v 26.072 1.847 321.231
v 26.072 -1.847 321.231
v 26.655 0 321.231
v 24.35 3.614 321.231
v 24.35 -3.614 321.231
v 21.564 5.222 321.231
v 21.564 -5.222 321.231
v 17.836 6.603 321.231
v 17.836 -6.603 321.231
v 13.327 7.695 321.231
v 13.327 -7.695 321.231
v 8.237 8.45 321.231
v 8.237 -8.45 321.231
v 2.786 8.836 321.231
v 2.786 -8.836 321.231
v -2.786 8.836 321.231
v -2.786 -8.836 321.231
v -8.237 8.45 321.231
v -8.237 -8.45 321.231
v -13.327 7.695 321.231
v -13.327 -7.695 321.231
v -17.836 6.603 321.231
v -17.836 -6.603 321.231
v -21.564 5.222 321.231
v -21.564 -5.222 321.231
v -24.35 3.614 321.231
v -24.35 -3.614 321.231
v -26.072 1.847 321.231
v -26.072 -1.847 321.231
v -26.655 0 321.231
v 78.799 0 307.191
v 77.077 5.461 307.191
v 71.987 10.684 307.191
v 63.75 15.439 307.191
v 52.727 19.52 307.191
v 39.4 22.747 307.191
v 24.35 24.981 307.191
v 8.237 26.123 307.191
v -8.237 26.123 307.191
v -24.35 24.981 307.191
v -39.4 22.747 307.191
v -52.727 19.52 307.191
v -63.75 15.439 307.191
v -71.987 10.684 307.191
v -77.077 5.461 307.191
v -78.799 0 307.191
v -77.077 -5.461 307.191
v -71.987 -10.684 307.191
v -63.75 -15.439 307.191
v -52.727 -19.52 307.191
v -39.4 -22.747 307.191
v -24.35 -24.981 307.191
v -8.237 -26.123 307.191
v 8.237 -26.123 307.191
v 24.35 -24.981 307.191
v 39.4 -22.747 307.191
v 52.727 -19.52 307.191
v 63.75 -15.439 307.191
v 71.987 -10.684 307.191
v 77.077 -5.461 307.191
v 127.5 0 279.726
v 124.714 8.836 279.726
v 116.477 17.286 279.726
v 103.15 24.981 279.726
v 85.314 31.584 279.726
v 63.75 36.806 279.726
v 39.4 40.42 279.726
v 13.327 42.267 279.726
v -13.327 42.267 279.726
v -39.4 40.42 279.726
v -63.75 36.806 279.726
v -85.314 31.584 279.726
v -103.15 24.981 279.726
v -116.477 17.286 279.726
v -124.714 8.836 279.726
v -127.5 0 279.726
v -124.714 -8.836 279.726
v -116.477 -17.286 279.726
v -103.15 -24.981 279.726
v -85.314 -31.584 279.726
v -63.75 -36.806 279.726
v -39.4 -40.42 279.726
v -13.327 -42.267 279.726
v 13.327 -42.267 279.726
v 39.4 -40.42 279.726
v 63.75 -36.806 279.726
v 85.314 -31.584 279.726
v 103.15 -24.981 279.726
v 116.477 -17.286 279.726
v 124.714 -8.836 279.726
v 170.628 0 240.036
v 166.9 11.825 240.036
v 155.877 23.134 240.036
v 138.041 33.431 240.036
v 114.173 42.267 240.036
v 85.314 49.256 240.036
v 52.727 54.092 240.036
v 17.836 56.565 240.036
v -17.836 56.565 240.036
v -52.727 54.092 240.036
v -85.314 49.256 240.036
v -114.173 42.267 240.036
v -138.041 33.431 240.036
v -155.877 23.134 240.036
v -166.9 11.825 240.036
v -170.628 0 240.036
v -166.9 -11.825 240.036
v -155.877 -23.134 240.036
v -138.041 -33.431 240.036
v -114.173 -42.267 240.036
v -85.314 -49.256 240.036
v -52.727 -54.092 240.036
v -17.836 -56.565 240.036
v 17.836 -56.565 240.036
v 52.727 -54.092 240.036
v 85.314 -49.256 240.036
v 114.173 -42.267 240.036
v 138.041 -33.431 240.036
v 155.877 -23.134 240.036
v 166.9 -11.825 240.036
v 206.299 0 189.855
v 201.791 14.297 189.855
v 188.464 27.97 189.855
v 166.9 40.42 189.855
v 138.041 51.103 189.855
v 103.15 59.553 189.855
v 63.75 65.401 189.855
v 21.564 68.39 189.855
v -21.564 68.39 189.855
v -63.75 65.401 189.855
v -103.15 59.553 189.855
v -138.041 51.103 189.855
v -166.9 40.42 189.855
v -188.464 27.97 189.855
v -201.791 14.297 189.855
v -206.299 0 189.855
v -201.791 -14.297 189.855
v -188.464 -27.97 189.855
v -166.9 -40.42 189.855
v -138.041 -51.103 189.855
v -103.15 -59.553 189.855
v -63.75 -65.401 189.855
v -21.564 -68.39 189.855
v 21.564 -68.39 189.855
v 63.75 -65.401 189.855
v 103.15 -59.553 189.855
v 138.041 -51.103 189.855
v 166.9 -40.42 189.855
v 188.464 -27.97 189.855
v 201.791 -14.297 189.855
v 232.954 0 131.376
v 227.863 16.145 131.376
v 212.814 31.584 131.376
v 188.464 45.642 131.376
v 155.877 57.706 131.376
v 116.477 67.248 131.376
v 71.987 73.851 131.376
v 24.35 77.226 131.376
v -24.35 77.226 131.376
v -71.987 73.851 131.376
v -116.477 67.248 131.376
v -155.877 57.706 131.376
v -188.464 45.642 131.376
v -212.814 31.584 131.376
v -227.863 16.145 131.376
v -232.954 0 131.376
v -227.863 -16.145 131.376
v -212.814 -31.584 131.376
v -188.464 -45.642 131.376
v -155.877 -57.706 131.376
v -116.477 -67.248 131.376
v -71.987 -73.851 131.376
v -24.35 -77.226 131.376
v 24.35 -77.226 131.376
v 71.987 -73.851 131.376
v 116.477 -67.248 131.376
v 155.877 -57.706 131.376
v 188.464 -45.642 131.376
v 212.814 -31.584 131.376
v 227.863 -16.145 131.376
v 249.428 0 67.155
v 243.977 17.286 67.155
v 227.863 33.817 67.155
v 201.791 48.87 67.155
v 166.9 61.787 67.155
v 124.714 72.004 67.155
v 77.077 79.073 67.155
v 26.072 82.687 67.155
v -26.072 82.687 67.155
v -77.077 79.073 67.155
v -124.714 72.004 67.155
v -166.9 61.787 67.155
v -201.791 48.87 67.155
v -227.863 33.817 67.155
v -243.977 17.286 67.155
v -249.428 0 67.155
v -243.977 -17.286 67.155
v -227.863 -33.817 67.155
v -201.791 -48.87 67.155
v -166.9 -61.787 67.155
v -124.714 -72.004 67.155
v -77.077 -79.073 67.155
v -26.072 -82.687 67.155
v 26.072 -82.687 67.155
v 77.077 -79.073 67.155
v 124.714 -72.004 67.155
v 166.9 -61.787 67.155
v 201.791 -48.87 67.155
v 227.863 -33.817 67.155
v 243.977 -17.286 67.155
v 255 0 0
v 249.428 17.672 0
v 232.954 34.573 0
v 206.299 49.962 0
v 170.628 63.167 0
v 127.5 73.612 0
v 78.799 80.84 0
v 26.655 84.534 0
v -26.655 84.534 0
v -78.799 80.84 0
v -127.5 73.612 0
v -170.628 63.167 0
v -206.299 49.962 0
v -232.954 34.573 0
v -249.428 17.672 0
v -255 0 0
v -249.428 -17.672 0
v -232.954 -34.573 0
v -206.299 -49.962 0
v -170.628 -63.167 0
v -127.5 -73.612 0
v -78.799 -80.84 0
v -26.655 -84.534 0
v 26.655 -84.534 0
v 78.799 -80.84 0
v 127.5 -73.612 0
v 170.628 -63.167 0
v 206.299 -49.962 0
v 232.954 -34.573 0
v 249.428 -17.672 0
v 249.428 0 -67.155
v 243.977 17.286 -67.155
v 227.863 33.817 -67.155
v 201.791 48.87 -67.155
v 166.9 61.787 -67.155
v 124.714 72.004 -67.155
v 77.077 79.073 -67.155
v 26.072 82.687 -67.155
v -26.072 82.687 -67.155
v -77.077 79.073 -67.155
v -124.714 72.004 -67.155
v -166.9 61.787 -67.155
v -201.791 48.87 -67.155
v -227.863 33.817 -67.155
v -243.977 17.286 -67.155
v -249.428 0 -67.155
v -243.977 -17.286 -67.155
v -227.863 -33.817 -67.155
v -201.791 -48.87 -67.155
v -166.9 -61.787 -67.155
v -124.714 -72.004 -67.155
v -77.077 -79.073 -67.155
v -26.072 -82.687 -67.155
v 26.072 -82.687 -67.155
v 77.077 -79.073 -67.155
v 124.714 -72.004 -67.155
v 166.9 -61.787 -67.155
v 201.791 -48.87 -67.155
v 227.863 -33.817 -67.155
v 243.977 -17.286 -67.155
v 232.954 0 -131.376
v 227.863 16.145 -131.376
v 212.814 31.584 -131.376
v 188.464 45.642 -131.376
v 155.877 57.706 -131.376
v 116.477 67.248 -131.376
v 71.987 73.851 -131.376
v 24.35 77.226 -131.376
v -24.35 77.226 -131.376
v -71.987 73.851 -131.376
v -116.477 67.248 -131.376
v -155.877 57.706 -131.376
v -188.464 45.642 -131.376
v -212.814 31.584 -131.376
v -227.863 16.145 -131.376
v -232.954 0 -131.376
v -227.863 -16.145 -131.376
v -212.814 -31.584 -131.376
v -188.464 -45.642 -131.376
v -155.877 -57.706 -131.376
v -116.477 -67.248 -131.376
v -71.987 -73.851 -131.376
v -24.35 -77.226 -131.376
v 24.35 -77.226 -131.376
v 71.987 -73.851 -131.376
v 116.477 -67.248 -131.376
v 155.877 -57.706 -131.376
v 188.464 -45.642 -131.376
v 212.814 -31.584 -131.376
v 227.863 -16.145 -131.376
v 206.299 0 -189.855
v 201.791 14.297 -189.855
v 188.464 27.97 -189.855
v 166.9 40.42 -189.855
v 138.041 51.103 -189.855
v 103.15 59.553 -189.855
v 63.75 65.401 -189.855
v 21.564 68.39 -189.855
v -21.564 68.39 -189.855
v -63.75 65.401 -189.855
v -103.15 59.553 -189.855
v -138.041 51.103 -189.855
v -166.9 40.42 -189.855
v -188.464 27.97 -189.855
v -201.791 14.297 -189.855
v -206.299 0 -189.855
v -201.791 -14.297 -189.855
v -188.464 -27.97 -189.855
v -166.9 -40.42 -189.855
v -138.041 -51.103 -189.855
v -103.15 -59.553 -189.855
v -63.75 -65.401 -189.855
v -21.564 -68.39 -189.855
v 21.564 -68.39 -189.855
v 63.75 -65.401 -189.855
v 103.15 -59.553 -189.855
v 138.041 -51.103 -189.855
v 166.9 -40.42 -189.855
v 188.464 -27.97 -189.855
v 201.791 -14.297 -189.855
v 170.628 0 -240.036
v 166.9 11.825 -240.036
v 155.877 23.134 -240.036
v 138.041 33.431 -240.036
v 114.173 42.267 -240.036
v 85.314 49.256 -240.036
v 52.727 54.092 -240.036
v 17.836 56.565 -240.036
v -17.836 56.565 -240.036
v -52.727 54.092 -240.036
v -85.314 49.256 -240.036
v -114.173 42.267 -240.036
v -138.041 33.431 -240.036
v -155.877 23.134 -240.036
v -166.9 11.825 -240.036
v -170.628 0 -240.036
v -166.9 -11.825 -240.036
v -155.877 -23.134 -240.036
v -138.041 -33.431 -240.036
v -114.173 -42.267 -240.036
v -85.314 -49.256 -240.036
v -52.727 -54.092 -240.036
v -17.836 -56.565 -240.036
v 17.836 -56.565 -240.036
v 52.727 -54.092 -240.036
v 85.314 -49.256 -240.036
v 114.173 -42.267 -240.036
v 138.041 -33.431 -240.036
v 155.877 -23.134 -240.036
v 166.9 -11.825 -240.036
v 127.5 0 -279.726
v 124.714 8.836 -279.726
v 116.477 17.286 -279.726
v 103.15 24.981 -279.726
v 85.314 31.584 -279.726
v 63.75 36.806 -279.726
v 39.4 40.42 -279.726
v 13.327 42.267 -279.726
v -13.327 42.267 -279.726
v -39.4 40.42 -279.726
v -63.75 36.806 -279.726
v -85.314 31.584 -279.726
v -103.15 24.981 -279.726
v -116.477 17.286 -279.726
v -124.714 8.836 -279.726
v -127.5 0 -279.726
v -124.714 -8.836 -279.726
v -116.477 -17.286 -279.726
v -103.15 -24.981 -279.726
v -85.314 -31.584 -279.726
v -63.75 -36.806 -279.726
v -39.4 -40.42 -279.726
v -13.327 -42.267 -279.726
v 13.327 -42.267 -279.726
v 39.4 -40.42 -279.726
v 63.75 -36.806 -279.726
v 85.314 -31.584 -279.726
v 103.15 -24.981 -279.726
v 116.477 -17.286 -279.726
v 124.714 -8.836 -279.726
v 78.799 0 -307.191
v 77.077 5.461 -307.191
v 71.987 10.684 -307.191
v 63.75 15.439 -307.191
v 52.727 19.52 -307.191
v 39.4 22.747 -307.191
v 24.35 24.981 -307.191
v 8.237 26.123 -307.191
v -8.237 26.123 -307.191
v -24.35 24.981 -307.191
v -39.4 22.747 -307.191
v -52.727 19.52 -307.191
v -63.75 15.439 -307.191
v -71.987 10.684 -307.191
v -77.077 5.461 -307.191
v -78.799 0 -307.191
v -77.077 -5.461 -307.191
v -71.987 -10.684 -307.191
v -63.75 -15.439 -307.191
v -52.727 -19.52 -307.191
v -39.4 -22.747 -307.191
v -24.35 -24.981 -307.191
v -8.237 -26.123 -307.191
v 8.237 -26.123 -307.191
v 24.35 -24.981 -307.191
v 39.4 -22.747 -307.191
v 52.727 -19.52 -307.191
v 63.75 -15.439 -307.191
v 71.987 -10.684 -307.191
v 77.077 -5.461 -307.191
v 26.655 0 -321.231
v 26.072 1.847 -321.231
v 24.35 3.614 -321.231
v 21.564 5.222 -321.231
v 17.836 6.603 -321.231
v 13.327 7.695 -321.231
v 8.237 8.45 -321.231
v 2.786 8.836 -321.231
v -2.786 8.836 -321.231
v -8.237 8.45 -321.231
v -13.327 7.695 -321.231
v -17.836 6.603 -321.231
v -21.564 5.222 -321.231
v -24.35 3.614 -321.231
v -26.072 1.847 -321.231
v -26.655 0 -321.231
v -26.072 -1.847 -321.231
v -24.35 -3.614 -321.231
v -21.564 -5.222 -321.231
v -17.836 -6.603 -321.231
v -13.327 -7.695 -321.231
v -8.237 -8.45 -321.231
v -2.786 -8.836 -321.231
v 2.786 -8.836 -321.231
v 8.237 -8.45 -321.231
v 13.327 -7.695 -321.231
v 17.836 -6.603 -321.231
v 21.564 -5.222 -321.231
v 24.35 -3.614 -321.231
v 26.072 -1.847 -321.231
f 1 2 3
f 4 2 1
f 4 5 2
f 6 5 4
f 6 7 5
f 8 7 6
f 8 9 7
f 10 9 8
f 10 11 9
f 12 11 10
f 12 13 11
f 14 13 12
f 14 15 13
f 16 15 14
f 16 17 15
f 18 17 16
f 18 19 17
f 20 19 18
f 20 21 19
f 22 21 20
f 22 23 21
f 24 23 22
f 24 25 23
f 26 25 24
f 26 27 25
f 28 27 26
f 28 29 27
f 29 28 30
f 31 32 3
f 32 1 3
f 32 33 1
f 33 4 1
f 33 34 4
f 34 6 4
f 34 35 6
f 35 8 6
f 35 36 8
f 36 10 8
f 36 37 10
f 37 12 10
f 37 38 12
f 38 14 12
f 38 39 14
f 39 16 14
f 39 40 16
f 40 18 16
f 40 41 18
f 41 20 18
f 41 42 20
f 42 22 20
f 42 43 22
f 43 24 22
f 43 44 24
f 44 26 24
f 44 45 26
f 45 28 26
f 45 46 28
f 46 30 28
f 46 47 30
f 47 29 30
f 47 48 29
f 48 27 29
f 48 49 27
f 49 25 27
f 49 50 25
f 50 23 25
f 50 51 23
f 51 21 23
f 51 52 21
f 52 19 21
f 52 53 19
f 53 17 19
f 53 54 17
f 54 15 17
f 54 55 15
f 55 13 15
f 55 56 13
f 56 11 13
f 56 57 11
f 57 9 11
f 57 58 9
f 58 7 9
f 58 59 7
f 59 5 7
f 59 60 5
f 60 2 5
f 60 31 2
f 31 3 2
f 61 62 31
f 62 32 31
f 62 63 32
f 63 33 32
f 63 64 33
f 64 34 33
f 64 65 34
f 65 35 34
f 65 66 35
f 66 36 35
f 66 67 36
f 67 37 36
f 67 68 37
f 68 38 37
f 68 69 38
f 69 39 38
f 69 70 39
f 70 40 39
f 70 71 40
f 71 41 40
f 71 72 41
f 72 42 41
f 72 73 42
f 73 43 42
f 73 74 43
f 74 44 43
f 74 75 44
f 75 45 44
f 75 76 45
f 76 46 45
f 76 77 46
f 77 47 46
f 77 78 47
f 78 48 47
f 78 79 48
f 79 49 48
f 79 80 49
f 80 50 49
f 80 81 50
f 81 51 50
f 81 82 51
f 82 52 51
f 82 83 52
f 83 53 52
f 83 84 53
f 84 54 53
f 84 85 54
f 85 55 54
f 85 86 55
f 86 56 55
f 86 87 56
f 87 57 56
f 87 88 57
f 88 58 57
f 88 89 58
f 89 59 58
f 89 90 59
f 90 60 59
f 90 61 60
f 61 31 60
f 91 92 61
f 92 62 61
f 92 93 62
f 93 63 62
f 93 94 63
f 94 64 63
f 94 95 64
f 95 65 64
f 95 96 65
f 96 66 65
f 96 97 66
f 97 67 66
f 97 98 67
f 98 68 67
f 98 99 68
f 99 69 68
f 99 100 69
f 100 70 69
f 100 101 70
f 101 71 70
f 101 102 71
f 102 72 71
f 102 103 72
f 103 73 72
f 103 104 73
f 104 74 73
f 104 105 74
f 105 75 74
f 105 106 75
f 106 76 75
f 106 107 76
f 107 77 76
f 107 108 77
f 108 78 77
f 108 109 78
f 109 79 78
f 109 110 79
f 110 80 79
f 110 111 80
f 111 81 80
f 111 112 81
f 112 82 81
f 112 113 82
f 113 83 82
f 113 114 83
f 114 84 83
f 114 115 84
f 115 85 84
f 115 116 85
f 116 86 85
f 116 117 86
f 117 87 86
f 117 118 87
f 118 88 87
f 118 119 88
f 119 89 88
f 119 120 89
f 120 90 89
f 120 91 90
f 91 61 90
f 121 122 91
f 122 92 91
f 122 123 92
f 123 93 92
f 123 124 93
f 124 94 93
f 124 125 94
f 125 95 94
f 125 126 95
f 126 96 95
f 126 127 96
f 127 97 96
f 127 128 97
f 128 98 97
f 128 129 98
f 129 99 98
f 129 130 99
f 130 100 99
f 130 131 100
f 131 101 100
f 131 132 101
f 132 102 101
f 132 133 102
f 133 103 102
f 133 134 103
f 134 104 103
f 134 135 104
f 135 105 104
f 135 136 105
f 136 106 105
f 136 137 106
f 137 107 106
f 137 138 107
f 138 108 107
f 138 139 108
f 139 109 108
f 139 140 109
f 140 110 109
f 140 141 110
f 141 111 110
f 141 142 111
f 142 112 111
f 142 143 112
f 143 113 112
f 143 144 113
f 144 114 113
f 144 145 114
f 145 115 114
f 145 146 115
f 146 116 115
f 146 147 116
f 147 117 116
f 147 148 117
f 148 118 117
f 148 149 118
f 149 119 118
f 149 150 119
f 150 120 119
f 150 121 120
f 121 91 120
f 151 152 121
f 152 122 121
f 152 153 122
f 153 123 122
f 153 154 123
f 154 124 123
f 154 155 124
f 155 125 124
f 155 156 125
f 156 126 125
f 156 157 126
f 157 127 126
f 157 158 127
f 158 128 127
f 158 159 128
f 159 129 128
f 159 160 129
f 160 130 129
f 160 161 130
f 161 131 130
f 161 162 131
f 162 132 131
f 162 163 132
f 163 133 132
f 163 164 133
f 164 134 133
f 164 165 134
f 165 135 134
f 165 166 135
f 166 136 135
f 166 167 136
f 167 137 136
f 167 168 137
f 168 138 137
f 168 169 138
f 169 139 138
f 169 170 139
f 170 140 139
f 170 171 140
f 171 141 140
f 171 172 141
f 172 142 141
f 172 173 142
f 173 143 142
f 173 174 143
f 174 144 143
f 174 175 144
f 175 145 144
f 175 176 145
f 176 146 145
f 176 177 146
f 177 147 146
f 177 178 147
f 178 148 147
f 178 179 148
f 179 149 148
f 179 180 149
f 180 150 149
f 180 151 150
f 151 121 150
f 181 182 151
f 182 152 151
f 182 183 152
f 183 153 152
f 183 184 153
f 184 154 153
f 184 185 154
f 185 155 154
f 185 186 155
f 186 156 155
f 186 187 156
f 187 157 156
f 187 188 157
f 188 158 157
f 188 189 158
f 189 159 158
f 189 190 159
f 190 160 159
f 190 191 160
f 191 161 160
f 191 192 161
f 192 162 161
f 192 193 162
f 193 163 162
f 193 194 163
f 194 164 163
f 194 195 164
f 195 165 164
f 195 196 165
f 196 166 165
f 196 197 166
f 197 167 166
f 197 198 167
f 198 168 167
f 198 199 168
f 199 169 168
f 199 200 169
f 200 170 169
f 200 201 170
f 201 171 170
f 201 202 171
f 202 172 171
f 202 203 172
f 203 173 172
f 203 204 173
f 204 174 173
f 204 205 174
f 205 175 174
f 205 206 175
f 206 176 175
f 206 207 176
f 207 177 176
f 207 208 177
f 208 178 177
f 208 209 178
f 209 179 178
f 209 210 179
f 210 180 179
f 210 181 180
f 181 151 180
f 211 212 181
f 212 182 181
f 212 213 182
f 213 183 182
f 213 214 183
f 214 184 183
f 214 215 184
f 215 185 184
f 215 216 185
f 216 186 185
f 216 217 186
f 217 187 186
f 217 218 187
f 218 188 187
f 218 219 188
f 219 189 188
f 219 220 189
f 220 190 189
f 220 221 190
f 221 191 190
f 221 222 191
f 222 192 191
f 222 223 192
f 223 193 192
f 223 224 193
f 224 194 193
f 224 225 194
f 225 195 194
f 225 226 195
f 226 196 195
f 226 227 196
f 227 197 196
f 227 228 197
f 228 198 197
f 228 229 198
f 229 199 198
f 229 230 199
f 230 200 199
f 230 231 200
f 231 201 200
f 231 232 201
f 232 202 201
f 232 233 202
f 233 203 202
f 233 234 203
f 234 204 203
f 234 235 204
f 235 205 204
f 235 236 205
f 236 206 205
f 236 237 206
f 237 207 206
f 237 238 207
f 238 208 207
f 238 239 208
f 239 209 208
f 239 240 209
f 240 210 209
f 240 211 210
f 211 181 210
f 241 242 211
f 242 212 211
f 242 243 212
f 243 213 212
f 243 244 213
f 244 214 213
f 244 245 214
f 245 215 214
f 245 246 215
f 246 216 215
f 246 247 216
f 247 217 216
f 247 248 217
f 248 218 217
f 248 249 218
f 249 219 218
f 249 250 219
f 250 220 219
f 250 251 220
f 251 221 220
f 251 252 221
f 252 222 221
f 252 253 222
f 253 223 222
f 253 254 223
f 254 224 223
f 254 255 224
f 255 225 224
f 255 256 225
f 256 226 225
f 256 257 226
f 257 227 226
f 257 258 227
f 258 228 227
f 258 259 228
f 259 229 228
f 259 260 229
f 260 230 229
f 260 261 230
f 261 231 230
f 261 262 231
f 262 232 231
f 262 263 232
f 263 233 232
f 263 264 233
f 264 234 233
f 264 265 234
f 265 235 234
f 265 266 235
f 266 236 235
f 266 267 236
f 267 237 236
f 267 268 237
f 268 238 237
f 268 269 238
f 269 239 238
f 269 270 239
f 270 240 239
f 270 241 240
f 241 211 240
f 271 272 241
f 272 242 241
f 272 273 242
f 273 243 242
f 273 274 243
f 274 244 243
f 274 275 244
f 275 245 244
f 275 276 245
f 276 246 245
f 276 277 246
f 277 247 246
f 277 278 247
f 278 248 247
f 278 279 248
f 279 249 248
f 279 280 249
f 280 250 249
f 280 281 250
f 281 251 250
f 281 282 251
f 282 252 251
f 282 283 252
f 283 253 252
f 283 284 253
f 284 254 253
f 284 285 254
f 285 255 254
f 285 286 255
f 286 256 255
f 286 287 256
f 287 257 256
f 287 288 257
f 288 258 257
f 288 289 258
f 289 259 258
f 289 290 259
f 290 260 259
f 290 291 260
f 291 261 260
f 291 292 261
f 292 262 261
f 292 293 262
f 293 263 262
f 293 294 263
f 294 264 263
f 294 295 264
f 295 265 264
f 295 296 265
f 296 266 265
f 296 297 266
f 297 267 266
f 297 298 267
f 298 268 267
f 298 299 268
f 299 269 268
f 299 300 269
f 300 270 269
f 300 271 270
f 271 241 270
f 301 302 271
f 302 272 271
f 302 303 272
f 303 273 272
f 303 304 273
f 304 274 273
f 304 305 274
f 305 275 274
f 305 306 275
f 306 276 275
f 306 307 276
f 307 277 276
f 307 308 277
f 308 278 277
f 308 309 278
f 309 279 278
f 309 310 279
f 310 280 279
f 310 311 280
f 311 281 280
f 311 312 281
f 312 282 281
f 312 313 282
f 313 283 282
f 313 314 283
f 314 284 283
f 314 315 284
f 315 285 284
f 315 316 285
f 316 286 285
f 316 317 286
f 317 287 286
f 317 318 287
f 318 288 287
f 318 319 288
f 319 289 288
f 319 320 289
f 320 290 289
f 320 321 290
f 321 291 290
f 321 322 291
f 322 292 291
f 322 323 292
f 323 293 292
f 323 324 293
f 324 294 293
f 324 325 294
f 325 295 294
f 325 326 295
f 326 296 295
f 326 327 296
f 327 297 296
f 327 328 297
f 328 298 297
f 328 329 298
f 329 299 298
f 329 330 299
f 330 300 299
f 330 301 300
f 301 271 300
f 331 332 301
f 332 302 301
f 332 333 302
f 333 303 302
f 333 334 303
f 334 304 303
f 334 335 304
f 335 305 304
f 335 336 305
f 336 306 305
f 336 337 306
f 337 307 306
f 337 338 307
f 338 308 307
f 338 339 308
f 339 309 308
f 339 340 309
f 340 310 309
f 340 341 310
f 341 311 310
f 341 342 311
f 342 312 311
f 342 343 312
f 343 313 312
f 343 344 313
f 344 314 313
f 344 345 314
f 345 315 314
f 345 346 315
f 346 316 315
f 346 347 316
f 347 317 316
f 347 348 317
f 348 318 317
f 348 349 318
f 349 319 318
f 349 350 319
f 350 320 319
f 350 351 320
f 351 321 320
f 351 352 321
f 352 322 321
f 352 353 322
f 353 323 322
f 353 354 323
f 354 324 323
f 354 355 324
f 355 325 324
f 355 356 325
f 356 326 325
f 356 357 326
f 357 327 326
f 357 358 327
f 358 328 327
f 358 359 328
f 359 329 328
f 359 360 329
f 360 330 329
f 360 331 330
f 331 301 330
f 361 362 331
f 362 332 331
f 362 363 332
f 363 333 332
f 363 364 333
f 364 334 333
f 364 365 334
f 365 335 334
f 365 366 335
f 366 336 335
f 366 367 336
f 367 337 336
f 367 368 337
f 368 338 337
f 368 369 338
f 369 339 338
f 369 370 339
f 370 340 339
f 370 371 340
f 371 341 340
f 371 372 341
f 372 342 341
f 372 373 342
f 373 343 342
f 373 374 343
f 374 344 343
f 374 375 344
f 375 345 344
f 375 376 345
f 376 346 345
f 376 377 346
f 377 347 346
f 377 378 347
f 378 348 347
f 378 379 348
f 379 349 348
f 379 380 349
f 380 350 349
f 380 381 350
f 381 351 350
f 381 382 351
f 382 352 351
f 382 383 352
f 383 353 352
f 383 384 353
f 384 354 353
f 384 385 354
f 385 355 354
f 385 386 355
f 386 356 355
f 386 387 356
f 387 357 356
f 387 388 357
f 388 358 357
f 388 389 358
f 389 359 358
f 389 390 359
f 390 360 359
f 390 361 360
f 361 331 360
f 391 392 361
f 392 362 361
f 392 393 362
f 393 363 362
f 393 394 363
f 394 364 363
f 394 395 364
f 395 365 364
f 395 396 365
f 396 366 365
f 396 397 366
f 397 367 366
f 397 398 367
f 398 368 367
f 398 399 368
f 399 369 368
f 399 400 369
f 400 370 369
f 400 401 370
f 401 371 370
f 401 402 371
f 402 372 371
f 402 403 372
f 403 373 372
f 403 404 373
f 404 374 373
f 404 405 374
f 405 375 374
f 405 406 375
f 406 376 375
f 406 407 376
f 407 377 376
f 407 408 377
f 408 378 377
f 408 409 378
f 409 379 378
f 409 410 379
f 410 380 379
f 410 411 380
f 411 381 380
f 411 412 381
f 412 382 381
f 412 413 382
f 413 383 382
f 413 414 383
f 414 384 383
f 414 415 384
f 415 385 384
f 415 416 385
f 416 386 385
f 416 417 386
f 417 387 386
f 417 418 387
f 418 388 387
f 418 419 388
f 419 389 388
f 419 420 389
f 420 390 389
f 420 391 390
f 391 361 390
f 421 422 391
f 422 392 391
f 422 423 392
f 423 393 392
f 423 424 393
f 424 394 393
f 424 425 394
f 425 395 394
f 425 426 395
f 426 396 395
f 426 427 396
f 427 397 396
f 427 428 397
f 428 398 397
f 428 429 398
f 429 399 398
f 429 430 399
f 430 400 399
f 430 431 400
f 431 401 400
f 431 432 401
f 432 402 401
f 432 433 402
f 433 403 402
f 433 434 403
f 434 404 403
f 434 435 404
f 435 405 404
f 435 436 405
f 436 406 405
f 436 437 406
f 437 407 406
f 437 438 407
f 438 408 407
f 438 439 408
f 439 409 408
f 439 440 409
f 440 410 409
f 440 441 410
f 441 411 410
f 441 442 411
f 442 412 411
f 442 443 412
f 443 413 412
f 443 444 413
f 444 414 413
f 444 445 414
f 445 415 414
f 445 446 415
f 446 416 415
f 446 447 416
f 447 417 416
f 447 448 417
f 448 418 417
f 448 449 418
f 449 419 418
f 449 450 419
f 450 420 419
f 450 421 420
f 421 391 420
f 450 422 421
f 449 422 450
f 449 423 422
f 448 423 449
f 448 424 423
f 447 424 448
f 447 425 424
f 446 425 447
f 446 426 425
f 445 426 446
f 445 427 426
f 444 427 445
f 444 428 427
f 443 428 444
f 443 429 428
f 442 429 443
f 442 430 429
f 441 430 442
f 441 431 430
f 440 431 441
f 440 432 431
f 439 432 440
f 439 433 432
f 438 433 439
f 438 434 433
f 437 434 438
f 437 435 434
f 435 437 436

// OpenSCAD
// Generated by SolidPython 1.0.1 on 2020-07-29 00:46:51


scale(v = [15, 5, 19]) {
	sphere(r = 17);
}
/***********************************************
*********      SolidPython code:      **********
************************************************
 
# import packages: SolidPython
from solid import *
from solid.utils import *
from itertools import chain, combinations, permutations


class Resize:

    def __init__(self, scad_file):
        self.scad_file = scad_file
        #self.scad_file = import_scad(scad_file)
        # cone/cylinder param:
        self.r1 = 0
        self.r2 = 0
        self.h = 0
        # rectangular prism param:
        self.w = 0
        self.l = 0
        # ellipse param:
        self.r = 0

    # import OpenScad code (file name corresponds to shape)


    # classify shape + parameters
    def assign(self, param1, param2, param3):
        if self.scad_file == 'cone.scad':
            self.r1 = param1
            self.r2 = param2
            self.h = param3
        elif self.scad_file == 'cylinder.scad':
            self.r1 = param1
            self.r2 = param2
            self.h = param3
        elif self.scad_file == 'rectangularPrism.scad':
            self.h = param1
            self.l = param2
            self.w = param3
        else:
            self.r = param1
            self.h = param2

    # resize parameters
    def iterate(self):
        x = range(3, 20, 2)
        i = 1
        if self.scad_file == 'cone.scad':
            tempList = list(permutations(x, 2))
            for temp in tempList:
                param1 = temp[0]
                param2 = temp[1]
                filepath = 'produced_scad_files/' + 'cone' + str(param1) + '_' + str(param2) + '_' + '.scad'
                scad_render_to_file(cylinder(h=param1, r1=param2, r2=0), filepath)

        elif self.scad_file == 'cylinder.scad':
            tempList = list(permutations(x, 3))
            for temp in tempList:
                param1 = temp[0]
                param2 = temp[1]
                filepath = 'produced_scad_files/' + 'cylinder' + str(param1) + '_' + str(param2) + '_' + '.scad'
                scad_render_to_file(cylinder(h=param1, r1=param2, r2=param2), filepath)

        elif self.scad_file == 'rectangularPrism.scad':
            tempList = list(permutations(x, 3))
            for temp in tempList:
                param1 = temp[0]
                param2 = temp[1]
                param3 = temp[2]
                filepath = 'produced_scad_files/' + 'rectangularPrism' + str(param1) + '_' + str(param2) + '_' + str(
                    param3) + '.scad'
                scad_render_to_file(cube(size=(param1, param2, param3)), filepath)

        elif self.scad_file == 'ellipse.scad':
            tempList = list(permutations(x, 4))
            for temp in tempList:
                param1 = temp[0]
                param2 = temp[1]
                param3 = temp[2]
                param4 = temp[3]
                filepath = 'produced_scad_files/' + 'ellipse' + str(param1) + '_' + str(param2) + '_' + str(param3) + '_' + str(param4) + '.scad'
                scad_render_to_file(scale([param1, param2, param3])(sphere(r=param4)), filepath)

    def render_to_scadfile(self):
        scad_render_to_file(scad, 'example.scad') 
 
************************************************/
